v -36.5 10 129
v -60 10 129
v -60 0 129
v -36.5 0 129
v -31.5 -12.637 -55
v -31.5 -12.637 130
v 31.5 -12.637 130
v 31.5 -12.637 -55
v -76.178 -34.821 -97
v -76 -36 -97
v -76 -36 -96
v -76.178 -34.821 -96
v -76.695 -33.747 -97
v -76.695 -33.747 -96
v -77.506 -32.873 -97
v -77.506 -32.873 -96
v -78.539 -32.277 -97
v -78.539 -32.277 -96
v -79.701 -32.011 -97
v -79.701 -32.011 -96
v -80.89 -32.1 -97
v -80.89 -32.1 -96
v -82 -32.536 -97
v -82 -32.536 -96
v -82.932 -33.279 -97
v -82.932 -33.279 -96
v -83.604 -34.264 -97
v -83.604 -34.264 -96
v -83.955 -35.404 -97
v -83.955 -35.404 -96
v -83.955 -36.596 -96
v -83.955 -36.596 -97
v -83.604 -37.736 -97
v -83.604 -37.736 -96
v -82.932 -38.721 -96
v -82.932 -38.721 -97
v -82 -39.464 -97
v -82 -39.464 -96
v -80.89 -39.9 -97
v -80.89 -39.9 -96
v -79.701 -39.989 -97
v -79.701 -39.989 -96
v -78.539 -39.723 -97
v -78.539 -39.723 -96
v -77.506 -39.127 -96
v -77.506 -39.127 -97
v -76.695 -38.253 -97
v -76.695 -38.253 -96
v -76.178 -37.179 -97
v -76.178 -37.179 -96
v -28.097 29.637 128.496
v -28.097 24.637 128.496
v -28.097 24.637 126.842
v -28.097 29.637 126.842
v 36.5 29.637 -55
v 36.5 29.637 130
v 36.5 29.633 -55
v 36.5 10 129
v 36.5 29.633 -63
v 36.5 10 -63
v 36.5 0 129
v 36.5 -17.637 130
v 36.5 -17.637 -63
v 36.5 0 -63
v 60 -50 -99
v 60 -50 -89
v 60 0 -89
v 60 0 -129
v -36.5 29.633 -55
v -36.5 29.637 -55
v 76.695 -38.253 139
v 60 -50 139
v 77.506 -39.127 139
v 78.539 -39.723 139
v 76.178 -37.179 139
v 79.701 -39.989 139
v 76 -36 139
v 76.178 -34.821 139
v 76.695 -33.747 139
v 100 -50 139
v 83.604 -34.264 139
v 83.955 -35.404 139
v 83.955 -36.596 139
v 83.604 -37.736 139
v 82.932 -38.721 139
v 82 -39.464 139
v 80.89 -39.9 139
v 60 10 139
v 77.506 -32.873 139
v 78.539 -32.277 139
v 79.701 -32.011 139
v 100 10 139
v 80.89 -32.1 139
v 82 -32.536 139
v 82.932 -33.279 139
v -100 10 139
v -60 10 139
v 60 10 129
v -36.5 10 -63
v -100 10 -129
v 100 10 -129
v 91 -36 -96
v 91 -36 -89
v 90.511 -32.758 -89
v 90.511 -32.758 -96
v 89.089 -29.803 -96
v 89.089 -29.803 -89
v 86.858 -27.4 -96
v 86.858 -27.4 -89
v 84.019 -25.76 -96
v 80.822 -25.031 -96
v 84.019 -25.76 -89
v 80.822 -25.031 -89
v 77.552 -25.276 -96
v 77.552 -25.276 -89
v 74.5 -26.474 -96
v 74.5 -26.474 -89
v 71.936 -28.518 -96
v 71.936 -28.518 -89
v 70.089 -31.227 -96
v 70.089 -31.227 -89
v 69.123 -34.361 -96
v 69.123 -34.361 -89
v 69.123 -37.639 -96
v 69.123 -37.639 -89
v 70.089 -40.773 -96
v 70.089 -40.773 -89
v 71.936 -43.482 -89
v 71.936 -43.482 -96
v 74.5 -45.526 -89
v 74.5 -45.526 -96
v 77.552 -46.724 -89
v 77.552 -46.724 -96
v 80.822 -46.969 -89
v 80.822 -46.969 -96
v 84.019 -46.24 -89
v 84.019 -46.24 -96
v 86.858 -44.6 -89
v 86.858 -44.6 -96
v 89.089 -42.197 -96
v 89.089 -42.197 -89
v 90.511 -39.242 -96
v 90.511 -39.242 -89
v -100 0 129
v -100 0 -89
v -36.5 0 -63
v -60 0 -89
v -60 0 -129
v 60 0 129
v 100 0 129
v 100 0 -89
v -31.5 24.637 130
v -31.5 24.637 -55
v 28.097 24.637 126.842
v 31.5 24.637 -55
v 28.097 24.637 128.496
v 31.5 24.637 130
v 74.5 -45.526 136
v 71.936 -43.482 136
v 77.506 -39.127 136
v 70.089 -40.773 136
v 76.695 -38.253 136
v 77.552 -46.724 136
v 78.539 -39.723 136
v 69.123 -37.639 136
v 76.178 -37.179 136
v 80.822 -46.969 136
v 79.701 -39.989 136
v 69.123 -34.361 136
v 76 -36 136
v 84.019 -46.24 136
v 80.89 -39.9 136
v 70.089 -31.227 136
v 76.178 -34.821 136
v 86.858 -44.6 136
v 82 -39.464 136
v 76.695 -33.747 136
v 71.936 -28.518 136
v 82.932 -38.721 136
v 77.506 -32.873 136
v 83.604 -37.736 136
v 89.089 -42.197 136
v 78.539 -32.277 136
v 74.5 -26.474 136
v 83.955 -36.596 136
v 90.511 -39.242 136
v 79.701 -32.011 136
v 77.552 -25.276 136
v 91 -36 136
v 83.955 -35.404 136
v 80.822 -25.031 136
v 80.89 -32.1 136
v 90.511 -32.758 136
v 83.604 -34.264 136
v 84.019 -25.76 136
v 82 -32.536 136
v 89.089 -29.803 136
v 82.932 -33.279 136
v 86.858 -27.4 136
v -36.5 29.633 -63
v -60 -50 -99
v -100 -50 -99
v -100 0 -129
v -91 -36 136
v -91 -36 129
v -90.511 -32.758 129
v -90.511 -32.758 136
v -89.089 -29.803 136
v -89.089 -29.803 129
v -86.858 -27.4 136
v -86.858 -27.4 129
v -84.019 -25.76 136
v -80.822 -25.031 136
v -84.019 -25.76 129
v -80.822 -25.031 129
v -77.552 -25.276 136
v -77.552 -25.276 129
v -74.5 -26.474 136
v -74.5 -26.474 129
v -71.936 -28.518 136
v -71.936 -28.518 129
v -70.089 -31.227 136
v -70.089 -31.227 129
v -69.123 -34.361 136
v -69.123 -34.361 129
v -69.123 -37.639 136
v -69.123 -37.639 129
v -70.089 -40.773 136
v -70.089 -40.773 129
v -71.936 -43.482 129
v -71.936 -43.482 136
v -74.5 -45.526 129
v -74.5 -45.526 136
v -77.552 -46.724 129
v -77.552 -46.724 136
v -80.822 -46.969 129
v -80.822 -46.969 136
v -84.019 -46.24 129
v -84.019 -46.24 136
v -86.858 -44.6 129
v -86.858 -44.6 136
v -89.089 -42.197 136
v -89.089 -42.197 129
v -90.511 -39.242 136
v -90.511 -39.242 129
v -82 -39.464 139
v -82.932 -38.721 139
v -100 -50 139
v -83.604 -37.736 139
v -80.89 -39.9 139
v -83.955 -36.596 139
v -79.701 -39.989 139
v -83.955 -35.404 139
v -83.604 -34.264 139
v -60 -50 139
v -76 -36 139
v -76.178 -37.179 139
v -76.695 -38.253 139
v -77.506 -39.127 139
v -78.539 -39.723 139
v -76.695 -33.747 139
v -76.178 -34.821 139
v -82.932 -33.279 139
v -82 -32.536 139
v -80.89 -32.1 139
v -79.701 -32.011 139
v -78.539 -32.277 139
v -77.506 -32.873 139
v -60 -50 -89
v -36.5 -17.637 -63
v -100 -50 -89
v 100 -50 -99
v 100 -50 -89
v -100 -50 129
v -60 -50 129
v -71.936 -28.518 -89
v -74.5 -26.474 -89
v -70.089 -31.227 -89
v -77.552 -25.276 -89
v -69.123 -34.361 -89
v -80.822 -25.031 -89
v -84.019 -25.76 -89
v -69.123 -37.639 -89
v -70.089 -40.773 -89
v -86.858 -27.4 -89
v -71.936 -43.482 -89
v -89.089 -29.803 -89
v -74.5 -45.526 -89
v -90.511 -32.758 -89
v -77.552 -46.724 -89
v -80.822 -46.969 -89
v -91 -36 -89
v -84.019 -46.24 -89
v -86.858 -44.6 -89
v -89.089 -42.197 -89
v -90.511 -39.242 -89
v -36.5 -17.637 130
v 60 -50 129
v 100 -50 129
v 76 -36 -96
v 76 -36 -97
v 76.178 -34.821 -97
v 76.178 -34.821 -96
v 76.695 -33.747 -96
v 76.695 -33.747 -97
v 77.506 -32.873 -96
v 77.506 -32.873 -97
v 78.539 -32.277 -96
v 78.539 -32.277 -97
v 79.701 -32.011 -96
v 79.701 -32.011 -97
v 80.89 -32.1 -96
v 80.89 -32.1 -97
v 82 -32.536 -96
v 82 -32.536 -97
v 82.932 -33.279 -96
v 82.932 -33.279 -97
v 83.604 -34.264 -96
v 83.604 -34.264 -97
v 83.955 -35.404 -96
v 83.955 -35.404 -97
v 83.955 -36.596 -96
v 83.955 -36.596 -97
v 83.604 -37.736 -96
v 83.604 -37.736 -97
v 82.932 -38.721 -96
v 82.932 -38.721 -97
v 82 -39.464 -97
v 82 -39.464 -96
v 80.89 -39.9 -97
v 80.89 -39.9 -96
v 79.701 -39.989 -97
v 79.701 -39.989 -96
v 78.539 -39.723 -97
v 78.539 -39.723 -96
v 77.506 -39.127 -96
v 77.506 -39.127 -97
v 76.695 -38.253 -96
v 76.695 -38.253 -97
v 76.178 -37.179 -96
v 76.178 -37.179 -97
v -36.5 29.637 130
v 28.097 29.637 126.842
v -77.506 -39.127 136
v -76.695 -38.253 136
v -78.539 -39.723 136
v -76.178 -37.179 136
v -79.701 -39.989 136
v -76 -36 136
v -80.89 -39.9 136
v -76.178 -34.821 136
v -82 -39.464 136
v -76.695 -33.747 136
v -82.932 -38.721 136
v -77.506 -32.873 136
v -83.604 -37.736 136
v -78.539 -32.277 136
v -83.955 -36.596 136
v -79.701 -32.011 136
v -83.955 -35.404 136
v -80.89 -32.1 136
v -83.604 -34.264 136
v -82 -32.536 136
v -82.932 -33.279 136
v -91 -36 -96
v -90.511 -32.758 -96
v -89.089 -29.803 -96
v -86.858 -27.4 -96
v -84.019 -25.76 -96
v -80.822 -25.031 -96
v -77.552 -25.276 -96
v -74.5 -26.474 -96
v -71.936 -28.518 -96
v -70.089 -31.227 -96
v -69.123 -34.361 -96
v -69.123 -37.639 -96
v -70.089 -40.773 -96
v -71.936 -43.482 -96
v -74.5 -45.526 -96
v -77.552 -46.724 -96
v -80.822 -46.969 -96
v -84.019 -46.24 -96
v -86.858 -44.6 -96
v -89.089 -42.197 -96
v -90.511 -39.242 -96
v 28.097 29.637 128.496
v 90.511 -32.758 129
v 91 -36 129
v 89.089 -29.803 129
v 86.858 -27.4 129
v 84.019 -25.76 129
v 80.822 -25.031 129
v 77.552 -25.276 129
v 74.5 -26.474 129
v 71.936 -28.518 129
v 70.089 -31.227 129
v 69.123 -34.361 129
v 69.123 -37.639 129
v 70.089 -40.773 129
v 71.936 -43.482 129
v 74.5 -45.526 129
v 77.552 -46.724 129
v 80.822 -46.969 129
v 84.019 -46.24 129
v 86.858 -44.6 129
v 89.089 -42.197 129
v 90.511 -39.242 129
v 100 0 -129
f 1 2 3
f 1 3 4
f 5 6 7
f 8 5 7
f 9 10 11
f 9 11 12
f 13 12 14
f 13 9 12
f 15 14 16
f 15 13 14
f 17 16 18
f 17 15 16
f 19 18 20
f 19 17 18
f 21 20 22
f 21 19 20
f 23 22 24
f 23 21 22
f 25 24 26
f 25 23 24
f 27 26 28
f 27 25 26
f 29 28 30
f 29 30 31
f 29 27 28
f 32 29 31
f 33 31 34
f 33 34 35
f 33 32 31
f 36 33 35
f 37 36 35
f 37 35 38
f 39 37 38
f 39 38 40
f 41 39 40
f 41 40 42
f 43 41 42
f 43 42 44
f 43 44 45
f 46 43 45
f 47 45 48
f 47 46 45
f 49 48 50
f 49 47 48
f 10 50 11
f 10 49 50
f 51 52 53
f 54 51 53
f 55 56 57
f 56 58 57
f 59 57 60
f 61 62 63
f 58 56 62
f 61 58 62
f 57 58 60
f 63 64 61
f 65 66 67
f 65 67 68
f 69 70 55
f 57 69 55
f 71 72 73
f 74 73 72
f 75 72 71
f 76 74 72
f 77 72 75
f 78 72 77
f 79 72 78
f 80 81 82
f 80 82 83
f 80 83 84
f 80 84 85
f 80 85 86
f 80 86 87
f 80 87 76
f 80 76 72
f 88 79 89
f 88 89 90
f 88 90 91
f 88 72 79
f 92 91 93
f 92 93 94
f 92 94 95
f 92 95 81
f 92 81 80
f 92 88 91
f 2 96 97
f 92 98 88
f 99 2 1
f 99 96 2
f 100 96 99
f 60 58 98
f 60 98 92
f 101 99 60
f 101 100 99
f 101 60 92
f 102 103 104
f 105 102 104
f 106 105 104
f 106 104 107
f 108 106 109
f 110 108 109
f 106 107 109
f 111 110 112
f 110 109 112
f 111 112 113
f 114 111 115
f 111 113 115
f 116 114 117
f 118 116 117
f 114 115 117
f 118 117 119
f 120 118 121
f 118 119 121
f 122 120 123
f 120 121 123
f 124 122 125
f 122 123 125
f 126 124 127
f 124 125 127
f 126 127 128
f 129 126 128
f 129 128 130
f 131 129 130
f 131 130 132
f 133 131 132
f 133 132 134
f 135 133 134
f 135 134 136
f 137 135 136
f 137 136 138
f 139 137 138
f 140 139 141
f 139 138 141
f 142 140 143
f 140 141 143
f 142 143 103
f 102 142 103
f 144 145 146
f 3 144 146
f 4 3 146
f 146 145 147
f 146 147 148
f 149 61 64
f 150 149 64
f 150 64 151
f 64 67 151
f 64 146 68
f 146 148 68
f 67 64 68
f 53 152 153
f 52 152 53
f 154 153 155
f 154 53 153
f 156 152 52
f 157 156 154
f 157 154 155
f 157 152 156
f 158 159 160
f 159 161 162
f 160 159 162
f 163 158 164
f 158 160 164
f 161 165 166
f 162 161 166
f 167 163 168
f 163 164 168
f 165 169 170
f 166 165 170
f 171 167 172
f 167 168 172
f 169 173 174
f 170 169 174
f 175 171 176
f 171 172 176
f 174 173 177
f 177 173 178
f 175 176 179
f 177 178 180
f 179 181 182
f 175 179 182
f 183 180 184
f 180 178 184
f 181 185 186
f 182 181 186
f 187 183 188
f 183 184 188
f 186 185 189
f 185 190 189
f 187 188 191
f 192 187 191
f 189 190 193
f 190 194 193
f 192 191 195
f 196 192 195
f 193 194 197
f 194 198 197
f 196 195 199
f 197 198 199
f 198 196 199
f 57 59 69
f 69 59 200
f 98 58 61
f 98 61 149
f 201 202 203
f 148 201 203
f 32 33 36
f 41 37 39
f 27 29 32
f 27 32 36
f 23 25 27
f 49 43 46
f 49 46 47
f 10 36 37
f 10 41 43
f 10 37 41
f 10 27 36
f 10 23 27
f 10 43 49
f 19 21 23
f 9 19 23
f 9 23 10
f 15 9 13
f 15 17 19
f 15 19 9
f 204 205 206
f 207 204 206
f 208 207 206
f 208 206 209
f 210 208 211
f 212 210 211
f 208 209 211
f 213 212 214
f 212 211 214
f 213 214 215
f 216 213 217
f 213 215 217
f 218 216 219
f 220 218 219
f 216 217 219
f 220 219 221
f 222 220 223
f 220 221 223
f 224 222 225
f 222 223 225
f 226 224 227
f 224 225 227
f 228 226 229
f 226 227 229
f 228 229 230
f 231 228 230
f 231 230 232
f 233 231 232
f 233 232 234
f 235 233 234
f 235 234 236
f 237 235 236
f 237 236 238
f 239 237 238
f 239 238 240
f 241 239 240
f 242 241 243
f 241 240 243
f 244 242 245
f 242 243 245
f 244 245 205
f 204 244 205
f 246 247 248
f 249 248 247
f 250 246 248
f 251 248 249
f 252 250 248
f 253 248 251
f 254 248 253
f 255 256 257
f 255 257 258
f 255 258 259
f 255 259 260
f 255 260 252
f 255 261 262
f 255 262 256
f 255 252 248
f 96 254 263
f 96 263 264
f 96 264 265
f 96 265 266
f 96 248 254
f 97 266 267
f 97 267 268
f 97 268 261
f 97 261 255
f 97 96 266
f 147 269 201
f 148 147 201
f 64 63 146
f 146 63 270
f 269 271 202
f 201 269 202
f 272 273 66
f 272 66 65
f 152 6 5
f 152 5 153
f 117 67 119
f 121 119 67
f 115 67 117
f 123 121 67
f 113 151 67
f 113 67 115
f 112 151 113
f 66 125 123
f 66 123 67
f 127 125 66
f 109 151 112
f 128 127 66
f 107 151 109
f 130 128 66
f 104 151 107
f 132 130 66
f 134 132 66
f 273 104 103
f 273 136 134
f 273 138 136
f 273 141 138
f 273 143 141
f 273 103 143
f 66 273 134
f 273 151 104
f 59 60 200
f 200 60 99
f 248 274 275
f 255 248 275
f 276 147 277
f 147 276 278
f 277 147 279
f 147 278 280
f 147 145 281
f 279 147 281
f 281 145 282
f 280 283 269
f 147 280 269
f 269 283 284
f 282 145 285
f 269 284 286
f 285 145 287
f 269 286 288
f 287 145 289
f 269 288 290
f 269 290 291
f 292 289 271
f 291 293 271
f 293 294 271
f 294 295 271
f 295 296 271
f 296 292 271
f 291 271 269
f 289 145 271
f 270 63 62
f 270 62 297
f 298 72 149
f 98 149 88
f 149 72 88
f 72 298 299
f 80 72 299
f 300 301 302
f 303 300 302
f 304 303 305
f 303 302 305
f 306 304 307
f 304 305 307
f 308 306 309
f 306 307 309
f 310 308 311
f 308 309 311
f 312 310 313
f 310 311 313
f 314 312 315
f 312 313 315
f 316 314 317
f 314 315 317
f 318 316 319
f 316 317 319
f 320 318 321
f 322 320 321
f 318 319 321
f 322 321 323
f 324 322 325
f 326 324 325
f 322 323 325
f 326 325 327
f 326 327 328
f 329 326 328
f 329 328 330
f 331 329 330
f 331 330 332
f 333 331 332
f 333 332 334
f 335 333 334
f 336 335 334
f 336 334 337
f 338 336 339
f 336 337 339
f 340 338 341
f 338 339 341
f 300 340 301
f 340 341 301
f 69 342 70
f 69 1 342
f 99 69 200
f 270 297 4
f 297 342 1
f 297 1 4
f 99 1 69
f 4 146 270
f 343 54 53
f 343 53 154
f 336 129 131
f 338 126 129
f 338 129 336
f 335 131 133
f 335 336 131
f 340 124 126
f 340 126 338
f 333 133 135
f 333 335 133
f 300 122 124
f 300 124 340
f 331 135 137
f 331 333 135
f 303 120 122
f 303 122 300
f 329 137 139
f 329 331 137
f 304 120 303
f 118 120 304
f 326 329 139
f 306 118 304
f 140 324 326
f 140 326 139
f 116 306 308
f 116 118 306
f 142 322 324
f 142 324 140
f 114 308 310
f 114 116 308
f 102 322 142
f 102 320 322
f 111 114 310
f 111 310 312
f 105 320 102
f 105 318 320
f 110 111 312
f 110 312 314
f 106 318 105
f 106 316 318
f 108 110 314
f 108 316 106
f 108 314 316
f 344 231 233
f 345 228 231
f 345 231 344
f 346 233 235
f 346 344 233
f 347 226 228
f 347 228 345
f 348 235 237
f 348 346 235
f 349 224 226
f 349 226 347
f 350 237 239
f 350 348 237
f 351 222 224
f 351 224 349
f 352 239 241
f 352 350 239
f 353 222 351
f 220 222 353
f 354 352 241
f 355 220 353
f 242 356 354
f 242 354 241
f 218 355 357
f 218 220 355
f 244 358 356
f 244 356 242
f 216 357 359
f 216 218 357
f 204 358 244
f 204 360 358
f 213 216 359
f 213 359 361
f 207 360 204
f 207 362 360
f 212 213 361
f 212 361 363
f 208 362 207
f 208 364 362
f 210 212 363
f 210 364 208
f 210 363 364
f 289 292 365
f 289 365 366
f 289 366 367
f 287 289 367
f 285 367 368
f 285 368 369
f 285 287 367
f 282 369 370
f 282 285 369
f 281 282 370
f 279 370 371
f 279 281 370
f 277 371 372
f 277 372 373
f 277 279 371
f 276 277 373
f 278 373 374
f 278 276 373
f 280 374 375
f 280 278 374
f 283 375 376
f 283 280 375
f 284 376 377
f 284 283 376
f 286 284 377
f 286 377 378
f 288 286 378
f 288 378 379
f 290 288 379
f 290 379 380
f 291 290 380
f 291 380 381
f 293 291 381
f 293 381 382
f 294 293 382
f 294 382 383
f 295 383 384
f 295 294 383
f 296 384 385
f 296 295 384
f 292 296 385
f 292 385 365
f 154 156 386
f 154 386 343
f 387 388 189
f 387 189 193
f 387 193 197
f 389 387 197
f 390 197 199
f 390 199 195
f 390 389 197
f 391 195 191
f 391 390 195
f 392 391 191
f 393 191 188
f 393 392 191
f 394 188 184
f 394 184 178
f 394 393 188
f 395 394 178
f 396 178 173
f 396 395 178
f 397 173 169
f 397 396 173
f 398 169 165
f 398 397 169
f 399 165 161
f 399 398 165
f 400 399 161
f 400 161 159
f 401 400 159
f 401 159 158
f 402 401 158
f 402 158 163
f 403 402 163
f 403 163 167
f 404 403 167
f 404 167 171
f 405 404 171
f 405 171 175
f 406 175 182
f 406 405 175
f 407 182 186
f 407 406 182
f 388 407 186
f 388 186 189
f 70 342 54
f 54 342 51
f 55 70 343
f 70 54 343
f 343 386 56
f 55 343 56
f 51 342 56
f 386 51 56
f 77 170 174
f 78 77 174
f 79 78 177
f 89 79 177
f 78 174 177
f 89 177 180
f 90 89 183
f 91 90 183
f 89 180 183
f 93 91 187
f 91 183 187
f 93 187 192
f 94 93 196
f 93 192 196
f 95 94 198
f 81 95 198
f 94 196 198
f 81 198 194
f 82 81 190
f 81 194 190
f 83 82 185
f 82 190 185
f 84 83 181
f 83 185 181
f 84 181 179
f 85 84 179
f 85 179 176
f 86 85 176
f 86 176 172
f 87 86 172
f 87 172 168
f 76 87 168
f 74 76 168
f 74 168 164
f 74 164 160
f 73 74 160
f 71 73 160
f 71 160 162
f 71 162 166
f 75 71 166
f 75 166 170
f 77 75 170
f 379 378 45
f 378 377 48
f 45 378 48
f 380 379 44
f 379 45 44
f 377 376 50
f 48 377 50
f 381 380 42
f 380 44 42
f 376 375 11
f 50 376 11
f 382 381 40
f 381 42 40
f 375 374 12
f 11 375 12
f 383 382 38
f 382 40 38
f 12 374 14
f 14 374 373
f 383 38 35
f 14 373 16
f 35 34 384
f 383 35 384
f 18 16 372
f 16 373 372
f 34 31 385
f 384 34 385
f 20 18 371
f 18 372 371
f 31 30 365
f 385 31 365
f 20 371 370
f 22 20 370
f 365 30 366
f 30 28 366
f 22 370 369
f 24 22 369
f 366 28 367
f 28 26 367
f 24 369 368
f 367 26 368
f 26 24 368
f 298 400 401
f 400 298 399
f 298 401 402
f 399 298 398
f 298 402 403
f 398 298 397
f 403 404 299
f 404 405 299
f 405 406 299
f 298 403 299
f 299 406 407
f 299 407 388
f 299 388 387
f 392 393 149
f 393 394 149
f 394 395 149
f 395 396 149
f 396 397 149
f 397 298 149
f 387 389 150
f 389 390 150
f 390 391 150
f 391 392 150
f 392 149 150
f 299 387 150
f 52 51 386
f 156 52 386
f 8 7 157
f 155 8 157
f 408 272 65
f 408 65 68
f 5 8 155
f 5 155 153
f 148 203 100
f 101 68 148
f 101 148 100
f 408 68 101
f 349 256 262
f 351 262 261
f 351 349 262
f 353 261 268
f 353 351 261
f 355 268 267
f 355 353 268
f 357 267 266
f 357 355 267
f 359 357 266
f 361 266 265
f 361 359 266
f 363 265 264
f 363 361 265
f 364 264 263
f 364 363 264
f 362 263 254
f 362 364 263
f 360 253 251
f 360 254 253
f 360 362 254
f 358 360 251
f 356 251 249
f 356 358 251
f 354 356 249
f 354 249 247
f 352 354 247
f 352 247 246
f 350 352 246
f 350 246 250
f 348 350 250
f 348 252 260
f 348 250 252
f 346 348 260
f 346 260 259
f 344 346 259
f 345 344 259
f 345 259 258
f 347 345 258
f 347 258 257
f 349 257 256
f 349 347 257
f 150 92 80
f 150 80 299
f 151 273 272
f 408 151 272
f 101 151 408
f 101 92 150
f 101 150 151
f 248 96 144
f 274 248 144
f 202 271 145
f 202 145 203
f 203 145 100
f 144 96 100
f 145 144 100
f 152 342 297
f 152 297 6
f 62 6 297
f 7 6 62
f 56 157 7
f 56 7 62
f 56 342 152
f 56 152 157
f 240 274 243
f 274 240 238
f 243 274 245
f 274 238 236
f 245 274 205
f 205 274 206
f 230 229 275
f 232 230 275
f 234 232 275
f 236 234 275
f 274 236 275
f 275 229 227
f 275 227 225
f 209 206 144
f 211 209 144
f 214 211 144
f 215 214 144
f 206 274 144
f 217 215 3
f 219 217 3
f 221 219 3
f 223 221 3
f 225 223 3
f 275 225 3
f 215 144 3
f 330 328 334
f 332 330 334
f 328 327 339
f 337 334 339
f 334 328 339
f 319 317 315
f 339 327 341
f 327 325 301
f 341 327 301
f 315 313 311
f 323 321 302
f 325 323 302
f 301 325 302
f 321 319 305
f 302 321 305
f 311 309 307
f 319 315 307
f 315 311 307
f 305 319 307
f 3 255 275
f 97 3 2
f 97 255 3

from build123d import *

# Parameters (mm, degrees)
SKETCH1_W                                  = 200
SKETCH1_H                                  = 258
BOSS_EXTRUDE1_DEPTH                        = 10
BOSS_EXTRUDE4_DEPTH                        = 40
SKETCH5_R                                  = 11
CUT_EXTRUDE2_DEPTH                         = 7
SKETCH6_W                                  = 200
SKETCH6_H                                  = 10
BOSS_EXTRUDE6_DEPTH                        = 60
SKETCH7_W                                  = 120
SKETCH7_H                                  = 60
CUT_EXTRUDE3_DEPTH                         = 10
MIRROR4_AT_THE_SECOND_PLANE_COPY_1_SKETC_R = 11
MIRROR4_AT_THE_SECOND_PLANE_COPY_1_DEPTH   = 7
SKETCH8_R                                  = 4
CUT_EXTRUDE4_DEPTH                         = 10
CUT_EXTRUDE6_START                         = -1
SKETCH9_R                                  = 4
CUT_EXTRUDE6_DEPTH                         = 1
SKETCH12_W                                 = 73
SKETCH12_H                                 = 47.27438
SKETCH12_W_2                               = 63
SKETCH12_H_2                               = 37.27438
BOSS_EXTRUDE8_DEPTH                        = 185
SKETCH14_W                                 = 63
SKETCH14_H                                 = 23.684822392
CUT_EXTRUDE7_DEPTH                         = 184
SKETCH15_W                                 = 73
SKETCH15_H                                 = 8
CUT_EXTRUDE8_DEPTH                         = 184
SKETCH16_W                                 = 73
SKETCH16_H                                 = 8
BOSS_EXTRUDE9_DEPTH                        = 47.27
SKETCH17_W                                 = 56.193521686
SKETCH17_H                                 = 1.65349891
CUT_EXTRUDE9_DEPTH                         = 7.27


with BuildPart() as part:
    # Sketch1 → Boss-Extrude1 (new body)
    with BuildSketch(Plane(origin=(0, 0, 0), x_dir=(1, 0, 0), z_dir=(0, 1, 0))):
        Rectangle(SKETCH1_W, SKETCH1_H)
    extrude(amount=BOSS_EXTRUDE1_DEPTH)

    # Sketch2 → Boss-Extrude4 (add)
    with BuildSketch(Plane(origin=(100, 0, 0), x_dir=(0, 0, -1), z_dir=(1, 0, 0))):
        Polygon((89, 0), (89, -50), (99, -50), (129, 0), align=None)
    boss_extrude4 = extrude(amount=-BOSS_EXTRUDE4_DEPTH)

    # Sketch5 → Cut-Extrude2 (cut)
    with BuildSketch(Plane.XY.offset(-89)):
        with Locations((80, -36)):
            Circle(SKETCH5_R)
    cut_extrude2 = extrude(amount=-CUT_EXTRUDE2_DEPTH, mode=Mode.SUBTRACT)

    # Mirror3: Boss-Extrude4, Cut-Extrude2 across plane
    add(boss_extrude4.mirror(Plane(origin=(0, 0, 0), x_dir=(0, 0, 1), z_dir=(1, 0, 0))))
    add(cut_extrude2.mirror(Plane(origin=(0, 0, 0), x_dir=(0, 0, 1), z_dir=(1, 0, 0))), mode=Mode.SUBTRACT)

    # Sketch6 → Boss-Extrude6 (add)
    with BuildSketch(Plane(origin=(0, 10, 0), x_dir=(1, 0, 0), z_dir=(0, 1, 0))):
        with Locations((0, -134)):
            Rectangle(SKETCH6_W, SKETCH6_H)
    extrude(amount=-BOSS_EXTRUDE6_DEPTH)

    # Sketch7 → Cut-Extrude3 (cut)
    with BuildSketch(Plane.XY.offset(139)):
        with Locations((0, -20)):
            Rectangle(SKETCH7_W, SKETCH7_H)
    extrude(amount=-CUT_EXTRUDE3_DEPTH, mode=Mode.SUBTRACT)

    # Mirror4: Cut-Extrude2 across plane
    add(cut_extrude2.mirror(Plane(origin=(0, 0, 0), x_dir=(0, 0, 1), z_dir=(1, 0, 0))), mode=Mode.SUBTRACT)

    # Mirror4 at the second plane: Cut-Extrude2 across plane
    add(cut_extrude2.mirror(Plane.XY.offset(20)), mode=Mode.SUBTRACT)

    # Mirror4 at the second plane copy 1 sketc → Mirror4 at the second plane copy 1 (cut)
    with BuildSketch(Plane(origin=(0, 0, 129), x_dir=(-1, 0, 0), z_dir=(0, 0, -1))):
        with Locations((80, -36)):
            Circle(MIRROR4_AT_THE_SECOND_PLANE_COPY_1_SKETC_R)
    extrude(amount=-MIRROR4_AT_THE_SECOND_PLANE_COPY_1_DEPTH, mode=Mode.SUBTRACT)

    # Sketch8 → Cut-Extrude4 (cut)
    with BuildSketch(Plane(origin=(0, 0, 136), x_dir=(-1, 0, 0), z_dir=(0, 0, -1))):
        with Locations((-80, -36)):
            Circle(SKETCH8_R)
    cut_extrude4 = extrude(amount=-CUT_EXTRUDE4_DEPTH, mode=Mode.SUBTRACT)

    # Mirror5: Cut-Extrude4 across plane
    add(cut_extrude4.mirror(Plane(origin=(0, 0, 0), x_dir=(0, 0, 1), z_dir=(1, 0, 0))), mode=Mode.SUBTRACT)

    # Sketch9 → Cut-Extrude6 (cut)
    with BuildSketch(Plane.XY.offset(-96).offset(CUT_EXTRUDE6_START)):
        with Locations((-80, -36)):
            Circle(SKETCH9_R)
    cut_extrude6 = extrude(amount=CUT_EXTRUDE6_DEPTH, mode=Mode.SUBTRACT)

    # Mirror6: Cut-Extrude6 across plane
    add(cut_extrude6.mirror(Plane(origin=(0, 0, 0), x_dir=(0, 0, 1), z_dir=(1, 0, 0))), mode=Mode.SUBTRACT)

    # Sketch14 → Cut-Extrude7 (cut)
    with BuildSketch(Plane.XY.offset(129)):
        Rectangle(SKETCH14_W, SKETCH14_H)
    extrude(amount=-CUT_EXTRUDE7_DEPTH, mode=Mode.SUBTRACT)

    # Sketch15 → Cut-Extrude8 (cut)
    with BuildSketch(Plane(origin=(0, -17.63719, 0), x_dir=(-1, 0, 0), z_dir=(0, -1, 0))):
        with Locations((0, 59)):
            Rectangle(SKETCH15_W, SKETCH15_H)
    extrude(amount=-CUT_EXTRUDE8_DEPTH, mode=Mode.SUBTRACT)



with BuildPart() as body_2:
    # Sketch12 → Boss-Extrude8 (new body)
    with BuildSketch(Plane.XY.offset(130)):
        with Locations((0, 6)):
            Rectangle(SKETCH12_W, SKETCH12_H)
        with Locations((0, 6)):
            Rectangle(SKETCH12_W_2, SKETCH12_H_2, mode=Mode.SUBTRACT)
    extrude(amount=-BOSS_EXTRUDE8_DEPTH)


with BuildPart() as part_1:
    add(part.part)

    add(body_2.part)  # Boss-Extrude9 merges body 2
    # Sketch16 → Boss-Extrude9 (add)
    with BuildSketch(Plane(origin=(0, -17.63719, 0), x_dir=(-1, 0, 0), z_dir=(0, -1, 0))):
        with Locations((0, 59)):
            Rectangle(SKETCH16_W, SKETCH16_H)
    extrude(amount=-BOSS_EXTRUDE9_DEPTH)

    # Sketch17 → Cut-Extrude9 (cut)
    with BuildSketch(Plane(origin=(0, 29.63719, 0), x_dir=(1, 0, 0), z_dir=(0, 1, 0))):
        with Locations((0, -127.668994325)):
            Rectangle(SKETCH17_W, SKETCH17_H)
    extrude(amount=-CUT_EXTRUDE9_DEPTH, mode=Mode.SUBTRACT)


solid = part_1.part
